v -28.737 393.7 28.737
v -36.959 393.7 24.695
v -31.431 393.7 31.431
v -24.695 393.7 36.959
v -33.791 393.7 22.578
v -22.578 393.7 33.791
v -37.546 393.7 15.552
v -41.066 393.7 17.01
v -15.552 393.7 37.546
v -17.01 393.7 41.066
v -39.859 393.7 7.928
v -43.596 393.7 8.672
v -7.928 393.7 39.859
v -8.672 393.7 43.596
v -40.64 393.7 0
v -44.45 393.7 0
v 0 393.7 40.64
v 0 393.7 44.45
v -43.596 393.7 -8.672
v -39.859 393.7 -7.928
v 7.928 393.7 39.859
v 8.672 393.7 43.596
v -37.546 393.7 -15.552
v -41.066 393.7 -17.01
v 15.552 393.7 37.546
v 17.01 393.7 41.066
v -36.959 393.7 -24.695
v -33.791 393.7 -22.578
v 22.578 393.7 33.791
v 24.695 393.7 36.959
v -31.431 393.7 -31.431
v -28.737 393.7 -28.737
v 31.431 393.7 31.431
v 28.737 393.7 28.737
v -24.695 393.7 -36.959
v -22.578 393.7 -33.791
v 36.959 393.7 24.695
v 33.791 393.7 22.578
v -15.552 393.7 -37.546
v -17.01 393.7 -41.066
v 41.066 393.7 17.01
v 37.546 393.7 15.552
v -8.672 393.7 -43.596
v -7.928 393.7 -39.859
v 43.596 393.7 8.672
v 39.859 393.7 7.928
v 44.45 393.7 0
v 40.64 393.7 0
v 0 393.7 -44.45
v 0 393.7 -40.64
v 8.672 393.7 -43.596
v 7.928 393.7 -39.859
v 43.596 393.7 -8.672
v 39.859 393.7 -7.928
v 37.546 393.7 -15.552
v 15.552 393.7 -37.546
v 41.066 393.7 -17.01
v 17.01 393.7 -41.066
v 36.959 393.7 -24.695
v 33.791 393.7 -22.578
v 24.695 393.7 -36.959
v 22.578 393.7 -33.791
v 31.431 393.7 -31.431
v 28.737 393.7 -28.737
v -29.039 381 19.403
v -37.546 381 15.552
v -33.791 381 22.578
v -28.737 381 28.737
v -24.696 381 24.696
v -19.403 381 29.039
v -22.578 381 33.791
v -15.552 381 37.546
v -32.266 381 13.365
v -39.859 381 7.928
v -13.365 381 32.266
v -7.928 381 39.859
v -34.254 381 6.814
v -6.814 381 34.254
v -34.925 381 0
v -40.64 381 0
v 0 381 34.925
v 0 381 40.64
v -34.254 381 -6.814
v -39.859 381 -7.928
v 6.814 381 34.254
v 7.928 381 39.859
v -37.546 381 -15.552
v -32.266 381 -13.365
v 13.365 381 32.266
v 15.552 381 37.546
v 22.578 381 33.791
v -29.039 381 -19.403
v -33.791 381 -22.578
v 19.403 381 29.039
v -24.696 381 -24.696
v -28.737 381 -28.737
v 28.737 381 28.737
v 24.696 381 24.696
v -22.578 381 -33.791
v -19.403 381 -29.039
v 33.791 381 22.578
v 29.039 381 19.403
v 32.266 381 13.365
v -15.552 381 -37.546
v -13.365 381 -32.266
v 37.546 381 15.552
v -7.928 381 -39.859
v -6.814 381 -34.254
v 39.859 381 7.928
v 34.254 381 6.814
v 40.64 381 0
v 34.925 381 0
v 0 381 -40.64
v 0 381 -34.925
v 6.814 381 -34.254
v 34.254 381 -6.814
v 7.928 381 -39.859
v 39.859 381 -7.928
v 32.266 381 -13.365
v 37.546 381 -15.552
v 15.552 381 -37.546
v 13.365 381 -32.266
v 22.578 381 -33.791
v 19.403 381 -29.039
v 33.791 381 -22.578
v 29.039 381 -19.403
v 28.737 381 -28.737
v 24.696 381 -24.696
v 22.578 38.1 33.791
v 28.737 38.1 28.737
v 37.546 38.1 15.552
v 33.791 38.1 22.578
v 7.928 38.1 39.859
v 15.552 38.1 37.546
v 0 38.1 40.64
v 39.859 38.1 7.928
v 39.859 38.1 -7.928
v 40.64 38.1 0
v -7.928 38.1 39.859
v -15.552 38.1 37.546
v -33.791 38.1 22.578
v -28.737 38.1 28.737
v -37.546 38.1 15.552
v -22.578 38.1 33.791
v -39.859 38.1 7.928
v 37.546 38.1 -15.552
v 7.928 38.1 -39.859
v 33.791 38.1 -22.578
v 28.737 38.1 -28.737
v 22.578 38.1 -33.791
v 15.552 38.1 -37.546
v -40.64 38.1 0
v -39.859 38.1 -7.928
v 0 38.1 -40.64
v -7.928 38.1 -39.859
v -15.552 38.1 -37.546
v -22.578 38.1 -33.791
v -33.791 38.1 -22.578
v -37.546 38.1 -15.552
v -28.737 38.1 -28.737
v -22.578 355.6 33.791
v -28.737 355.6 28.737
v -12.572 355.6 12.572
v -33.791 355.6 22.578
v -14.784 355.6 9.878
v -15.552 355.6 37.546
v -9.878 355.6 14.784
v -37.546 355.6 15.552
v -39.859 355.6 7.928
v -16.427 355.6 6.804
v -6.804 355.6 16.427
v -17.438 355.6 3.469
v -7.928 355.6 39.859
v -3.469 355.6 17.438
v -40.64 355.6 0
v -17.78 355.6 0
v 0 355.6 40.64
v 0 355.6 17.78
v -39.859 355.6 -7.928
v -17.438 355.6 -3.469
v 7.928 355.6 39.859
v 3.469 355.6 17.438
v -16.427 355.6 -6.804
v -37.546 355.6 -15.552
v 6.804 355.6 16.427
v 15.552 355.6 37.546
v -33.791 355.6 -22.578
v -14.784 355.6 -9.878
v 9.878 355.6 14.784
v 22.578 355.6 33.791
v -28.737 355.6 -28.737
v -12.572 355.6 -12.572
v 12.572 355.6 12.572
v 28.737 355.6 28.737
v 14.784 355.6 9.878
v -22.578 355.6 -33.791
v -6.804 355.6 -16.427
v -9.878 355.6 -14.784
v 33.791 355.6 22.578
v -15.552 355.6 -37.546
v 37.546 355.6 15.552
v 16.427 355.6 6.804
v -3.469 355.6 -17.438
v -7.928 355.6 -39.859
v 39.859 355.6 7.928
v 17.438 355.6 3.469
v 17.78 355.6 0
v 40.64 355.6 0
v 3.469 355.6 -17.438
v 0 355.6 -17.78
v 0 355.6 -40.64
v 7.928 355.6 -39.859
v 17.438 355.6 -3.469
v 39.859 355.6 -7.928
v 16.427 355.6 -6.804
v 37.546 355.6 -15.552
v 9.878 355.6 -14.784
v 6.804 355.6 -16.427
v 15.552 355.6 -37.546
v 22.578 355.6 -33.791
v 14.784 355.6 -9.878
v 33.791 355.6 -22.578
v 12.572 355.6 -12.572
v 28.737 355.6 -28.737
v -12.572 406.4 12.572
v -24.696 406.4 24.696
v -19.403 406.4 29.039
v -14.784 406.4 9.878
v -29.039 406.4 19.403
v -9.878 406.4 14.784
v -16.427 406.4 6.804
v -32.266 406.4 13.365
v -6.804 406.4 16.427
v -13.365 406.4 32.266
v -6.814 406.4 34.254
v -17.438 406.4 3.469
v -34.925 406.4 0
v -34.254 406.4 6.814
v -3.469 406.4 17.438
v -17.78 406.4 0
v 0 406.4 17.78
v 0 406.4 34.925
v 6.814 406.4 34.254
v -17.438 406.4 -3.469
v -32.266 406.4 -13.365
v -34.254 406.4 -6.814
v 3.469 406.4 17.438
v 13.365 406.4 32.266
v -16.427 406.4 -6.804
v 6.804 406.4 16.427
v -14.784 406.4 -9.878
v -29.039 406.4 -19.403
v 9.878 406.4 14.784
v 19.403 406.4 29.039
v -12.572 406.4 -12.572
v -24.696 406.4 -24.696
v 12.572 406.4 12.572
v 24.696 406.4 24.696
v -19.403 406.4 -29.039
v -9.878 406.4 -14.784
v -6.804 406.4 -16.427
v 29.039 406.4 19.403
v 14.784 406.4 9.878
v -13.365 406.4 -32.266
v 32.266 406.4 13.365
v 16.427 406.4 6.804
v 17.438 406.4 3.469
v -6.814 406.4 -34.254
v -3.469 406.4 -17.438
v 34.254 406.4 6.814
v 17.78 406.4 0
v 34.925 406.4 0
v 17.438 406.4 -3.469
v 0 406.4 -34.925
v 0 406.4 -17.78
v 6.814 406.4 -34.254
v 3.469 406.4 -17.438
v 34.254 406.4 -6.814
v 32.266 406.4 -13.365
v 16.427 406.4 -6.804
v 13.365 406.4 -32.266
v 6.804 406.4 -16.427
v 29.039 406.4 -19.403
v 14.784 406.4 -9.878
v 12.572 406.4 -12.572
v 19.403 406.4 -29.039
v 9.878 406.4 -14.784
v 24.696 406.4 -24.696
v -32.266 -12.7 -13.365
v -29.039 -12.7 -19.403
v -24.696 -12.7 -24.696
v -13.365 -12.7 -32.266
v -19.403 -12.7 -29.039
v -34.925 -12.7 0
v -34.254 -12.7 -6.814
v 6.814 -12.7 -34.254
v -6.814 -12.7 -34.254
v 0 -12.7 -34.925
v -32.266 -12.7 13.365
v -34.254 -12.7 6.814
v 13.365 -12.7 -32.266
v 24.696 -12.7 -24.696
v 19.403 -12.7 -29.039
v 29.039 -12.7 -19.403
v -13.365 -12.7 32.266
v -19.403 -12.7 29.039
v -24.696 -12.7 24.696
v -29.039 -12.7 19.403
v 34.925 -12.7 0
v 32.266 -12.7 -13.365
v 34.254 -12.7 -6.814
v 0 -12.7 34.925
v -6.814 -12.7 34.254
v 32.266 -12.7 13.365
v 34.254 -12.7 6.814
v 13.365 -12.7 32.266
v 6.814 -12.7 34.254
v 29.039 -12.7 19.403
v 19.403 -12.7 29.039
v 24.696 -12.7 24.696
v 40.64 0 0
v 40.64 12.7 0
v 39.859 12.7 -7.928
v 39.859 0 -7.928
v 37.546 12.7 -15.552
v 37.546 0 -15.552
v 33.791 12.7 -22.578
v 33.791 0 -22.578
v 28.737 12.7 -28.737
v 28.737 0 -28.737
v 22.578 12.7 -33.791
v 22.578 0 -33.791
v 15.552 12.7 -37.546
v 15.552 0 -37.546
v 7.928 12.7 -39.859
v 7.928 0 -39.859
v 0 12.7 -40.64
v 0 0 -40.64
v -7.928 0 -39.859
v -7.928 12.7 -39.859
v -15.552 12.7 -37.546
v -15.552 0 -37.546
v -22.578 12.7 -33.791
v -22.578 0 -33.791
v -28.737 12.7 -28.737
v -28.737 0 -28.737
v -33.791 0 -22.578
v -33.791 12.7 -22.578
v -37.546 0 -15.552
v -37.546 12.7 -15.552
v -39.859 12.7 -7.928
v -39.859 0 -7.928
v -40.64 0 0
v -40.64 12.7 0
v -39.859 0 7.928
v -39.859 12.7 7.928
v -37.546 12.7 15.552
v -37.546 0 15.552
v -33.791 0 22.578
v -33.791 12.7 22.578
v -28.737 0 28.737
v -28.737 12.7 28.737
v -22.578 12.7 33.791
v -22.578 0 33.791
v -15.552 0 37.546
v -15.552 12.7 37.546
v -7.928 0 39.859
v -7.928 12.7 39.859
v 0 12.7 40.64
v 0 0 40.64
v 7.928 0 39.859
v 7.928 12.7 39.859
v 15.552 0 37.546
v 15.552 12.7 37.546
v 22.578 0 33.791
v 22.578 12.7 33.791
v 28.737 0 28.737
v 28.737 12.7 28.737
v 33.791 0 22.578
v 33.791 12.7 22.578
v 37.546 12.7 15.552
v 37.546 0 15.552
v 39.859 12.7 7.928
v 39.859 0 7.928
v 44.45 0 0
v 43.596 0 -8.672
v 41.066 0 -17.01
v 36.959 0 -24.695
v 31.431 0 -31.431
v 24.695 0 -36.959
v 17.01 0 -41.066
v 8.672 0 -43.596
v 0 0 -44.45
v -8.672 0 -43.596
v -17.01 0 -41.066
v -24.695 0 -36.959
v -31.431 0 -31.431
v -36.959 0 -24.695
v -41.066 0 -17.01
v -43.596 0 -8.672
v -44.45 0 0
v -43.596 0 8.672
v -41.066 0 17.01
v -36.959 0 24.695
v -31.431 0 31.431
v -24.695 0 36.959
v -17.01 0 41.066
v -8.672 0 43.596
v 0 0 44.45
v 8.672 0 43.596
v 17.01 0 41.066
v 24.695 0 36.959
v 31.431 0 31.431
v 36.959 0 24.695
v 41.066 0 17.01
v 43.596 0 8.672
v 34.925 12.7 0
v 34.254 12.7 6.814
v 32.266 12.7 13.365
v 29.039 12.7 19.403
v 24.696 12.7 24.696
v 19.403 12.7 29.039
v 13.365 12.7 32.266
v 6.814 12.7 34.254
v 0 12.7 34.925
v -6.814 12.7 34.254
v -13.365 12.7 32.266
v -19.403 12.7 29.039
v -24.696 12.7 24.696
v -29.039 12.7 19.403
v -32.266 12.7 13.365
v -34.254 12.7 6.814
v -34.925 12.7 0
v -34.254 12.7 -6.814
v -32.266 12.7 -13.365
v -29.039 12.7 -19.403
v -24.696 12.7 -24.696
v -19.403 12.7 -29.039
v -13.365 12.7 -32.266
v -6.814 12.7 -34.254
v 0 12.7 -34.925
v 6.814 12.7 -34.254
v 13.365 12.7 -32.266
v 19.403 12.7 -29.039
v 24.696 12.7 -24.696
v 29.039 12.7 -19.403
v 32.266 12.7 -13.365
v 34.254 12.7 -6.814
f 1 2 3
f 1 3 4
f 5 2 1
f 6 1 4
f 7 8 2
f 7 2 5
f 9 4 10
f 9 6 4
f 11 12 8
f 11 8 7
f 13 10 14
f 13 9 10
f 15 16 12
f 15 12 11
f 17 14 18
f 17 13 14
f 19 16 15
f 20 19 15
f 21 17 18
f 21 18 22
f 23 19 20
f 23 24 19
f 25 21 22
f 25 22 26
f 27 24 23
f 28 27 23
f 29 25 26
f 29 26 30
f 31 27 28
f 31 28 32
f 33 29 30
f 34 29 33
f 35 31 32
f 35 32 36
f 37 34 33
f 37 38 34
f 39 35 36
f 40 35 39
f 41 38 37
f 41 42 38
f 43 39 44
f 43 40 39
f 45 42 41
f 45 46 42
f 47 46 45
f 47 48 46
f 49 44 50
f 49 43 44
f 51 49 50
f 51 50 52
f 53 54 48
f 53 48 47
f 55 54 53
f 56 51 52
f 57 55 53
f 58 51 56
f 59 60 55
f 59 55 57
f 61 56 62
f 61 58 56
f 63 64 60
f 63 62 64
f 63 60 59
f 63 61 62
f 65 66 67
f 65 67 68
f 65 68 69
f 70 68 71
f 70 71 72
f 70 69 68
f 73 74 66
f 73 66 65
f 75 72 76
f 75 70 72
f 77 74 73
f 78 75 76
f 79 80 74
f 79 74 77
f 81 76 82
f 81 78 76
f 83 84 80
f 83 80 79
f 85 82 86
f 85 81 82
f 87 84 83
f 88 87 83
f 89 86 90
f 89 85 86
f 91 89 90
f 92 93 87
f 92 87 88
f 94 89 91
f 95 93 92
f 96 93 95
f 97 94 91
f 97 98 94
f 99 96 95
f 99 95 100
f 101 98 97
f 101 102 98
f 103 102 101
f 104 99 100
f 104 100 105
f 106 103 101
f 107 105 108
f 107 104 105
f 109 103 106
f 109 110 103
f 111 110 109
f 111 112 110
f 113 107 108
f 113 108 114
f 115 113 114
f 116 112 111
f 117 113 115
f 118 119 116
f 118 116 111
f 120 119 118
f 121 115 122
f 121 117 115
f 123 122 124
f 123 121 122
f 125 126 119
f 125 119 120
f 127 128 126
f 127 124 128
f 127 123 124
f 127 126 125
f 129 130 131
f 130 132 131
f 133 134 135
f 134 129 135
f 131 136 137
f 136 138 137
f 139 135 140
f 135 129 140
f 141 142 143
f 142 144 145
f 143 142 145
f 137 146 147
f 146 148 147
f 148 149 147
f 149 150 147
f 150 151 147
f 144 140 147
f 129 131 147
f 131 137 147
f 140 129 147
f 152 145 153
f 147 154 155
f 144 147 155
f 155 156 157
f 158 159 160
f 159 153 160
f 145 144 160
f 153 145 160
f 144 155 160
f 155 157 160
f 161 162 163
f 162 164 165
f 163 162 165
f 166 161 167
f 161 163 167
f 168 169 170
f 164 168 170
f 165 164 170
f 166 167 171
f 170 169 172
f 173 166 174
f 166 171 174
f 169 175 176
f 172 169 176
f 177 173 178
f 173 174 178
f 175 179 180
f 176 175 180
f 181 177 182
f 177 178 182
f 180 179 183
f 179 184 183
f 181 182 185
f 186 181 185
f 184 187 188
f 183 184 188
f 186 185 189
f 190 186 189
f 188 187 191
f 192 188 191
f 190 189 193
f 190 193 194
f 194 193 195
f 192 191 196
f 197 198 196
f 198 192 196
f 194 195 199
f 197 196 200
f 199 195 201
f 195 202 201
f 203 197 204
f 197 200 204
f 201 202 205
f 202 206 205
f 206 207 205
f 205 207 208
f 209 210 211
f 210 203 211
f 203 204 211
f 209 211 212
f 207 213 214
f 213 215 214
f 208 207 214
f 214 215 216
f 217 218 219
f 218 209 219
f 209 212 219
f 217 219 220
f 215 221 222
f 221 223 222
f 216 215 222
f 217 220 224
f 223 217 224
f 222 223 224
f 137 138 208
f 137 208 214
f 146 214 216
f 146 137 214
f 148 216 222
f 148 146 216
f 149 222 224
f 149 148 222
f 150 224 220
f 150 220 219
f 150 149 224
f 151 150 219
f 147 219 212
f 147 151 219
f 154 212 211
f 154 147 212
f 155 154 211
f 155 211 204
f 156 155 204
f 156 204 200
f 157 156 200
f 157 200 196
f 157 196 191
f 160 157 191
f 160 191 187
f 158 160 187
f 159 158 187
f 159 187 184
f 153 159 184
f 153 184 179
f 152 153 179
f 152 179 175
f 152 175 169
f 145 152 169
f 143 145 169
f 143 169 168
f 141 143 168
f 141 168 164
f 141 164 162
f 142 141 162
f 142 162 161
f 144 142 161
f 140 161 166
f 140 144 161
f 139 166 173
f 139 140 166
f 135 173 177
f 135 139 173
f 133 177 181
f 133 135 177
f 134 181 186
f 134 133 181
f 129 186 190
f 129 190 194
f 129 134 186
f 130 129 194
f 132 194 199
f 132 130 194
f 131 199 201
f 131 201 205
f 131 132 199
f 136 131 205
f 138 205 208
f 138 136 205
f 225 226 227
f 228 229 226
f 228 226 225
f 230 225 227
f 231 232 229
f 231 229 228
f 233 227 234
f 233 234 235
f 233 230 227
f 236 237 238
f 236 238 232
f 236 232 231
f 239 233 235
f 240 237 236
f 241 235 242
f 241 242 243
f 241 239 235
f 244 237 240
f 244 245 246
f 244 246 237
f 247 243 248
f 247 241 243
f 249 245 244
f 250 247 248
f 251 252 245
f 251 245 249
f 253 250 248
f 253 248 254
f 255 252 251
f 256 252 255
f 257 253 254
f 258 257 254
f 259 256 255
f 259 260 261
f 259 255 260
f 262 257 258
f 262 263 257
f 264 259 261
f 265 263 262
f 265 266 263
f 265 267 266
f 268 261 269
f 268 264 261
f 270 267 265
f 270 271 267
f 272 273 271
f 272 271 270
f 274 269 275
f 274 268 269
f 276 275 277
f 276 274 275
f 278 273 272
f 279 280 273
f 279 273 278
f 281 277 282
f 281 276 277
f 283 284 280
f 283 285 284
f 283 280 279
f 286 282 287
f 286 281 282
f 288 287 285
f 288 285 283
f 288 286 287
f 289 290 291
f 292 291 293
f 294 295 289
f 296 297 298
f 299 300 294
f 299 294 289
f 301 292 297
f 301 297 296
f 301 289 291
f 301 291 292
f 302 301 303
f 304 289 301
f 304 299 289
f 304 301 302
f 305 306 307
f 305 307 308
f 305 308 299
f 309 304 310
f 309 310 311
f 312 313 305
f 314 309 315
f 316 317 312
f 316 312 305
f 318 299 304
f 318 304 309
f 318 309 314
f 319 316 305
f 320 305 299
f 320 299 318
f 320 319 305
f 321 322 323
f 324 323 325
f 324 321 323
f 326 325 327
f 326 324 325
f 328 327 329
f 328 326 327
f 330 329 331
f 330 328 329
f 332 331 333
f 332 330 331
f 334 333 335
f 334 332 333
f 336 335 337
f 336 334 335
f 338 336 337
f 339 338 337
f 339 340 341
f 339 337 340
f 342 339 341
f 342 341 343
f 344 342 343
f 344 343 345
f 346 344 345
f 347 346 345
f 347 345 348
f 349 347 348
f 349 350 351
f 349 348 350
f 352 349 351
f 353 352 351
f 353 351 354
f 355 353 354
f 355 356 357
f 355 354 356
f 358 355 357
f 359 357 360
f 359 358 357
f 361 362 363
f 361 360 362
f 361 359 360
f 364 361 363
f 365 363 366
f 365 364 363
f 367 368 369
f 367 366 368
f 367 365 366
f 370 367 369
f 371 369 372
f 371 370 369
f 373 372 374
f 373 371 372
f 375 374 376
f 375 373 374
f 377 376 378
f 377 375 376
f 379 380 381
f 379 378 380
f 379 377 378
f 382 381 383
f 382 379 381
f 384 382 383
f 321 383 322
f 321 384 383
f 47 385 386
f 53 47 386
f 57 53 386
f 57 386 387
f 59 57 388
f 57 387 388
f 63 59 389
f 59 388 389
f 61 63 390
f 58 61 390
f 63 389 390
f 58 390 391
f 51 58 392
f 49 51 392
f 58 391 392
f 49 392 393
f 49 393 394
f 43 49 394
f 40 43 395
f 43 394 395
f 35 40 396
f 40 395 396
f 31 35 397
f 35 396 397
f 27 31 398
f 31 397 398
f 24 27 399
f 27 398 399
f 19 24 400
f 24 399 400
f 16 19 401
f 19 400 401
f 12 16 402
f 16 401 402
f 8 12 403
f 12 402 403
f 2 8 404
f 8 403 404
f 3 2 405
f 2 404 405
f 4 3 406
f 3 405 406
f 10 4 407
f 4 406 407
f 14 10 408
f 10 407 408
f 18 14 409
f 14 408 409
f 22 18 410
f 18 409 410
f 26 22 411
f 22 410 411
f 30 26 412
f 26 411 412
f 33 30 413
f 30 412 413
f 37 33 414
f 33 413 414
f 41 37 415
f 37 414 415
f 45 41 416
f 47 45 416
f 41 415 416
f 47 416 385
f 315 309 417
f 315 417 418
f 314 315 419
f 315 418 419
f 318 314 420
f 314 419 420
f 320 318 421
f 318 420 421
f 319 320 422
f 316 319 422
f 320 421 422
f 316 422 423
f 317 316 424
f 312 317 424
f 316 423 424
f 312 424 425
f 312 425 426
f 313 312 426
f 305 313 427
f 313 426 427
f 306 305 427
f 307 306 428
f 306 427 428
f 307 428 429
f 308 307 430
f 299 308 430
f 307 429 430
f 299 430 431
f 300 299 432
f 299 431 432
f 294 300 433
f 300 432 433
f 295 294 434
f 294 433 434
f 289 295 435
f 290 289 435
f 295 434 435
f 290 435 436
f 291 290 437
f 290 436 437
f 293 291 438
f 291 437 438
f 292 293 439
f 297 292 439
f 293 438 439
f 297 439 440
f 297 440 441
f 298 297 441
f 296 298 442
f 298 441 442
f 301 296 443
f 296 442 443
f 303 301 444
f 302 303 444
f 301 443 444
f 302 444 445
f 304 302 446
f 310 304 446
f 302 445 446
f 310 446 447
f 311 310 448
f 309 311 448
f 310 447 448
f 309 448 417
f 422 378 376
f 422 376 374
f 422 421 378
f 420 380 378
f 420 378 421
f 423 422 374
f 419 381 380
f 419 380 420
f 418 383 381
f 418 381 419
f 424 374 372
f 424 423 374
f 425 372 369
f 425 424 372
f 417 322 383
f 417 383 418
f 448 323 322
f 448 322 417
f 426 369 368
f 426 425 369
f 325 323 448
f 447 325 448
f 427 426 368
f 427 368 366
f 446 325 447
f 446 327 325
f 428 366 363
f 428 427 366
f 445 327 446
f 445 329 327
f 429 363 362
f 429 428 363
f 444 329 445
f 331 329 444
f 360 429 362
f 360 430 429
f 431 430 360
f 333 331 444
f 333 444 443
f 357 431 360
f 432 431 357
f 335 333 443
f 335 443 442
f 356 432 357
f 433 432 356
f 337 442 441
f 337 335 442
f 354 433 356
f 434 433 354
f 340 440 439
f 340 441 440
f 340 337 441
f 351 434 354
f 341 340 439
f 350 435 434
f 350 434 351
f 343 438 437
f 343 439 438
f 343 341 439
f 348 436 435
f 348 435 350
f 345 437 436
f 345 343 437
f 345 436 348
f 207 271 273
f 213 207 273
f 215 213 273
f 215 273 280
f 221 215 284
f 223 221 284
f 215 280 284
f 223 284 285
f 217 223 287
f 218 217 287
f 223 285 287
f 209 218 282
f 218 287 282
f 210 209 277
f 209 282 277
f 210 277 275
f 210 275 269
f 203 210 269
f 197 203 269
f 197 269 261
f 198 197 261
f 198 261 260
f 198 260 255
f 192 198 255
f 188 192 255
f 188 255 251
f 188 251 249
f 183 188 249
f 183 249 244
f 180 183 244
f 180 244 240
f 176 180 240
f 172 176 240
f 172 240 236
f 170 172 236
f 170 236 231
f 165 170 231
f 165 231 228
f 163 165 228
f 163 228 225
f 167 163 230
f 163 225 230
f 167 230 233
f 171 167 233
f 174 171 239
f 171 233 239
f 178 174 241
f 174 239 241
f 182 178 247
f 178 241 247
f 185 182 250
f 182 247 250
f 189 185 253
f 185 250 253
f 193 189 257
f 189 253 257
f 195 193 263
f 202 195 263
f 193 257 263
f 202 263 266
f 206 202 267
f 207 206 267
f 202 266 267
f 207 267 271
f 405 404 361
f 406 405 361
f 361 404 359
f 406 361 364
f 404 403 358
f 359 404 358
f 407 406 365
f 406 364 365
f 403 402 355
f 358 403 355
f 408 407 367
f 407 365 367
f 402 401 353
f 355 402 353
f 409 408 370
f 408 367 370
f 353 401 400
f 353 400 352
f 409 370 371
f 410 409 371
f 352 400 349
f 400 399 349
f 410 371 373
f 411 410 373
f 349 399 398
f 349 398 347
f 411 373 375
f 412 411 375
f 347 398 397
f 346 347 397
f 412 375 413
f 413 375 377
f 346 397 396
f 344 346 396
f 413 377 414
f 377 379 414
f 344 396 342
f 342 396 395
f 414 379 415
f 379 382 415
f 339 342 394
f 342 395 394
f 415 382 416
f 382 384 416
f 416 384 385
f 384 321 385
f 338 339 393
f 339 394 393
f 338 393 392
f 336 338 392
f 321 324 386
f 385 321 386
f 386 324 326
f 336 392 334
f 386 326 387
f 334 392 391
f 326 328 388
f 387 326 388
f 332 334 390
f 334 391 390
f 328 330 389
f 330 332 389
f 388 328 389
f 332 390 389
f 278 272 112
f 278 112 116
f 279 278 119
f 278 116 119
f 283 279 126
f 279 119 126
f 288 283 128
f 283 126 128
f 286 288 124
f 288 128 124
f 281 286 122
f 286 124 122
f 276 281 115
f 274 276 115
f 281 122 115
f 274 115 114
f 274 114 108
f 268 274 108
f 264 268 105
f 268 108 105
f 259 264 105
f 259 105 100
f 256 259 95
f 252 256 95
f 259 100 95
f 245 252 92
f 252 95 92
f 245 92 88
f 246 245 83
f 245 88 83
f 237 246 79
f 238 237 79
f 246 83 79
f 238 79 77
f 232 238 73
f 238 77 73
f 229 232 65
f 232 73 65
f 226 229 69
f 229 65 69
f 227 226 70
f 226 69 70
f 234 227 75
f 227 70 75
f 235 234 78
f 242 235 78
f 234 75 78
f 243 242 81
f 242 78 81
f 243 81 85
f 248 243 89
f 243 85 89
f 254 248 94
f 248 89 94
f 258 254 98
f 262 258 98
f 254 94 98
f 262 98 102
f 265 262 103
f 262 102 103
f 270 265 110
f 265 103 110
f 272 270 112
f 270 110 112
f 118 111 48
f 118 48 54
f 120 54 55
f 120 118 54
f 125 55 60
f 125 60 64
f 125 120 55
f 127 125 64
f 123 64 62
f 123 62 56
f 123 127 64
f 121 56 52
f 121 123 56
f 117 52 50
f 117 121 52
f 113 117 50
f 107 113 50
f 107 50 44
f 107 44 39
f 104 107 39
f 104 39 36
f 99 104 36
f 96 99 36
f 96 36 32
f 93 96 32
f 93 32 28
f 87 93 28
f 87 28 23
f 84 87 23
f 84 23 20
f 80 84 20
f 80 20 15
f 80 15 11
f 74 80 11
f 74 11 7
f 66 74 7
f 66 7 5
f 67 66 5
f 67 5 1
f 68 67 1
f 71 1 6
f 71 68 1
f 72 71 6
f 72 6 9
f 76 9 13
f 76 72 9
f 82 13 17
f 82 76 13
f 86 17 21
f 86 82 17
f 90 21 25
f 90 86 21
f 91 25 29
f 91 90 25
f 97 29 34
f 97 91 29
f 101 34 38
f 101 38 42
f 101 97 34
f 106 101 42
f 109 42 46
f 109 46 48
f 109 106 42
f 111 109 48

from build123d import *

# Parameters (mm, degrees)
SKETCH1_R           = 44.45
SKETCH1_R_2         = 40.64
BOSS_EXTRUDE1_DEPTH = 393.7
SKETCH3_R           = 40.64
BOSS_EXTRUDE2_DEPTH = 25.4
SKETCH4_R           = 34.925
BOSS_EXTRUDE3_DEPTH = 25.4
SKETCH6_R           = 40.64
BOSS_EXTRUDE4_DEPTH = 25.4
SKETCH7_R           = 34.925
BOSS_EXTRUDE5_DEPTH = 25.4
SKETCH9_R           = 17.78
CUT_EXTRUDE1_DEPTH  = 152.4


with BuildPart() as part:
    # Sketch1 → Boss-Extrude1 (new body)
    with BuildSketch(Plane(origin=(0, 0, 0), x_dir=(1, 0, 0), z_dir=(0, 1, 0))):
        Circle(SKETCH1_R)
        Circle(SKETCH1_R_2, mode=Mode.SUBTRACT)
    extrude(amount=BOSS_EXTRUDE1_DEPTH)

    # Sketch3 → Boss-Extrude2 (add)
    with BuildSketch(Plane(origin=(0, 355.6, 0), x_dir=(1, 0, 0), z_dir=(0, 1, 0))):
        Circle(SKETCH3_R)
    extrude(amount=BOSS_EXTRUDE2_DEPTH)

    # Sketch4 → Boss-Extrude3 (add)
    with BuildSketch(Plane(origin=(0, 381, 0), x_dir=(1, 0, 0), z_dir=(0, 1, 0))):
        Circle(SKETCH4_R)
    extrude(amount=BOSS_EXTRUDE3_DEPTH)

    # Sketch6 → Boss-Extrude4 (add)
    with BuildSketch(Plane(origin=(0, 38.1, 0), x_dir=(-1, 0, 0), z_dir=(0, -1, 0))):
        Circle(SKETCH6_R)
    extrude(amount=BOSS_EXTRUDE4_DEPTH)

    # Sketch7 → Boss-Extrude5 (add)
    with BuildSketch(Plane.XZ.offset(-12.7)):
        Circle(SKETCH7_R)
    extrude(amount=BOSS_EXTRUDE5_DEPTH)

    # Sketch9 → Cut-Extrude1 (cut)
    with BuildSketch(Plane(origin=(0, 406.4, 0), x_dir=(1, 0, 0), z_dir=(0, 1, 0))):
        Circle(SKETCH9_R)
    extrude(amount=-CUT_EXTRUDE1_DEPTH, mode=Mode.SUBTRACT)


solid = part.part
